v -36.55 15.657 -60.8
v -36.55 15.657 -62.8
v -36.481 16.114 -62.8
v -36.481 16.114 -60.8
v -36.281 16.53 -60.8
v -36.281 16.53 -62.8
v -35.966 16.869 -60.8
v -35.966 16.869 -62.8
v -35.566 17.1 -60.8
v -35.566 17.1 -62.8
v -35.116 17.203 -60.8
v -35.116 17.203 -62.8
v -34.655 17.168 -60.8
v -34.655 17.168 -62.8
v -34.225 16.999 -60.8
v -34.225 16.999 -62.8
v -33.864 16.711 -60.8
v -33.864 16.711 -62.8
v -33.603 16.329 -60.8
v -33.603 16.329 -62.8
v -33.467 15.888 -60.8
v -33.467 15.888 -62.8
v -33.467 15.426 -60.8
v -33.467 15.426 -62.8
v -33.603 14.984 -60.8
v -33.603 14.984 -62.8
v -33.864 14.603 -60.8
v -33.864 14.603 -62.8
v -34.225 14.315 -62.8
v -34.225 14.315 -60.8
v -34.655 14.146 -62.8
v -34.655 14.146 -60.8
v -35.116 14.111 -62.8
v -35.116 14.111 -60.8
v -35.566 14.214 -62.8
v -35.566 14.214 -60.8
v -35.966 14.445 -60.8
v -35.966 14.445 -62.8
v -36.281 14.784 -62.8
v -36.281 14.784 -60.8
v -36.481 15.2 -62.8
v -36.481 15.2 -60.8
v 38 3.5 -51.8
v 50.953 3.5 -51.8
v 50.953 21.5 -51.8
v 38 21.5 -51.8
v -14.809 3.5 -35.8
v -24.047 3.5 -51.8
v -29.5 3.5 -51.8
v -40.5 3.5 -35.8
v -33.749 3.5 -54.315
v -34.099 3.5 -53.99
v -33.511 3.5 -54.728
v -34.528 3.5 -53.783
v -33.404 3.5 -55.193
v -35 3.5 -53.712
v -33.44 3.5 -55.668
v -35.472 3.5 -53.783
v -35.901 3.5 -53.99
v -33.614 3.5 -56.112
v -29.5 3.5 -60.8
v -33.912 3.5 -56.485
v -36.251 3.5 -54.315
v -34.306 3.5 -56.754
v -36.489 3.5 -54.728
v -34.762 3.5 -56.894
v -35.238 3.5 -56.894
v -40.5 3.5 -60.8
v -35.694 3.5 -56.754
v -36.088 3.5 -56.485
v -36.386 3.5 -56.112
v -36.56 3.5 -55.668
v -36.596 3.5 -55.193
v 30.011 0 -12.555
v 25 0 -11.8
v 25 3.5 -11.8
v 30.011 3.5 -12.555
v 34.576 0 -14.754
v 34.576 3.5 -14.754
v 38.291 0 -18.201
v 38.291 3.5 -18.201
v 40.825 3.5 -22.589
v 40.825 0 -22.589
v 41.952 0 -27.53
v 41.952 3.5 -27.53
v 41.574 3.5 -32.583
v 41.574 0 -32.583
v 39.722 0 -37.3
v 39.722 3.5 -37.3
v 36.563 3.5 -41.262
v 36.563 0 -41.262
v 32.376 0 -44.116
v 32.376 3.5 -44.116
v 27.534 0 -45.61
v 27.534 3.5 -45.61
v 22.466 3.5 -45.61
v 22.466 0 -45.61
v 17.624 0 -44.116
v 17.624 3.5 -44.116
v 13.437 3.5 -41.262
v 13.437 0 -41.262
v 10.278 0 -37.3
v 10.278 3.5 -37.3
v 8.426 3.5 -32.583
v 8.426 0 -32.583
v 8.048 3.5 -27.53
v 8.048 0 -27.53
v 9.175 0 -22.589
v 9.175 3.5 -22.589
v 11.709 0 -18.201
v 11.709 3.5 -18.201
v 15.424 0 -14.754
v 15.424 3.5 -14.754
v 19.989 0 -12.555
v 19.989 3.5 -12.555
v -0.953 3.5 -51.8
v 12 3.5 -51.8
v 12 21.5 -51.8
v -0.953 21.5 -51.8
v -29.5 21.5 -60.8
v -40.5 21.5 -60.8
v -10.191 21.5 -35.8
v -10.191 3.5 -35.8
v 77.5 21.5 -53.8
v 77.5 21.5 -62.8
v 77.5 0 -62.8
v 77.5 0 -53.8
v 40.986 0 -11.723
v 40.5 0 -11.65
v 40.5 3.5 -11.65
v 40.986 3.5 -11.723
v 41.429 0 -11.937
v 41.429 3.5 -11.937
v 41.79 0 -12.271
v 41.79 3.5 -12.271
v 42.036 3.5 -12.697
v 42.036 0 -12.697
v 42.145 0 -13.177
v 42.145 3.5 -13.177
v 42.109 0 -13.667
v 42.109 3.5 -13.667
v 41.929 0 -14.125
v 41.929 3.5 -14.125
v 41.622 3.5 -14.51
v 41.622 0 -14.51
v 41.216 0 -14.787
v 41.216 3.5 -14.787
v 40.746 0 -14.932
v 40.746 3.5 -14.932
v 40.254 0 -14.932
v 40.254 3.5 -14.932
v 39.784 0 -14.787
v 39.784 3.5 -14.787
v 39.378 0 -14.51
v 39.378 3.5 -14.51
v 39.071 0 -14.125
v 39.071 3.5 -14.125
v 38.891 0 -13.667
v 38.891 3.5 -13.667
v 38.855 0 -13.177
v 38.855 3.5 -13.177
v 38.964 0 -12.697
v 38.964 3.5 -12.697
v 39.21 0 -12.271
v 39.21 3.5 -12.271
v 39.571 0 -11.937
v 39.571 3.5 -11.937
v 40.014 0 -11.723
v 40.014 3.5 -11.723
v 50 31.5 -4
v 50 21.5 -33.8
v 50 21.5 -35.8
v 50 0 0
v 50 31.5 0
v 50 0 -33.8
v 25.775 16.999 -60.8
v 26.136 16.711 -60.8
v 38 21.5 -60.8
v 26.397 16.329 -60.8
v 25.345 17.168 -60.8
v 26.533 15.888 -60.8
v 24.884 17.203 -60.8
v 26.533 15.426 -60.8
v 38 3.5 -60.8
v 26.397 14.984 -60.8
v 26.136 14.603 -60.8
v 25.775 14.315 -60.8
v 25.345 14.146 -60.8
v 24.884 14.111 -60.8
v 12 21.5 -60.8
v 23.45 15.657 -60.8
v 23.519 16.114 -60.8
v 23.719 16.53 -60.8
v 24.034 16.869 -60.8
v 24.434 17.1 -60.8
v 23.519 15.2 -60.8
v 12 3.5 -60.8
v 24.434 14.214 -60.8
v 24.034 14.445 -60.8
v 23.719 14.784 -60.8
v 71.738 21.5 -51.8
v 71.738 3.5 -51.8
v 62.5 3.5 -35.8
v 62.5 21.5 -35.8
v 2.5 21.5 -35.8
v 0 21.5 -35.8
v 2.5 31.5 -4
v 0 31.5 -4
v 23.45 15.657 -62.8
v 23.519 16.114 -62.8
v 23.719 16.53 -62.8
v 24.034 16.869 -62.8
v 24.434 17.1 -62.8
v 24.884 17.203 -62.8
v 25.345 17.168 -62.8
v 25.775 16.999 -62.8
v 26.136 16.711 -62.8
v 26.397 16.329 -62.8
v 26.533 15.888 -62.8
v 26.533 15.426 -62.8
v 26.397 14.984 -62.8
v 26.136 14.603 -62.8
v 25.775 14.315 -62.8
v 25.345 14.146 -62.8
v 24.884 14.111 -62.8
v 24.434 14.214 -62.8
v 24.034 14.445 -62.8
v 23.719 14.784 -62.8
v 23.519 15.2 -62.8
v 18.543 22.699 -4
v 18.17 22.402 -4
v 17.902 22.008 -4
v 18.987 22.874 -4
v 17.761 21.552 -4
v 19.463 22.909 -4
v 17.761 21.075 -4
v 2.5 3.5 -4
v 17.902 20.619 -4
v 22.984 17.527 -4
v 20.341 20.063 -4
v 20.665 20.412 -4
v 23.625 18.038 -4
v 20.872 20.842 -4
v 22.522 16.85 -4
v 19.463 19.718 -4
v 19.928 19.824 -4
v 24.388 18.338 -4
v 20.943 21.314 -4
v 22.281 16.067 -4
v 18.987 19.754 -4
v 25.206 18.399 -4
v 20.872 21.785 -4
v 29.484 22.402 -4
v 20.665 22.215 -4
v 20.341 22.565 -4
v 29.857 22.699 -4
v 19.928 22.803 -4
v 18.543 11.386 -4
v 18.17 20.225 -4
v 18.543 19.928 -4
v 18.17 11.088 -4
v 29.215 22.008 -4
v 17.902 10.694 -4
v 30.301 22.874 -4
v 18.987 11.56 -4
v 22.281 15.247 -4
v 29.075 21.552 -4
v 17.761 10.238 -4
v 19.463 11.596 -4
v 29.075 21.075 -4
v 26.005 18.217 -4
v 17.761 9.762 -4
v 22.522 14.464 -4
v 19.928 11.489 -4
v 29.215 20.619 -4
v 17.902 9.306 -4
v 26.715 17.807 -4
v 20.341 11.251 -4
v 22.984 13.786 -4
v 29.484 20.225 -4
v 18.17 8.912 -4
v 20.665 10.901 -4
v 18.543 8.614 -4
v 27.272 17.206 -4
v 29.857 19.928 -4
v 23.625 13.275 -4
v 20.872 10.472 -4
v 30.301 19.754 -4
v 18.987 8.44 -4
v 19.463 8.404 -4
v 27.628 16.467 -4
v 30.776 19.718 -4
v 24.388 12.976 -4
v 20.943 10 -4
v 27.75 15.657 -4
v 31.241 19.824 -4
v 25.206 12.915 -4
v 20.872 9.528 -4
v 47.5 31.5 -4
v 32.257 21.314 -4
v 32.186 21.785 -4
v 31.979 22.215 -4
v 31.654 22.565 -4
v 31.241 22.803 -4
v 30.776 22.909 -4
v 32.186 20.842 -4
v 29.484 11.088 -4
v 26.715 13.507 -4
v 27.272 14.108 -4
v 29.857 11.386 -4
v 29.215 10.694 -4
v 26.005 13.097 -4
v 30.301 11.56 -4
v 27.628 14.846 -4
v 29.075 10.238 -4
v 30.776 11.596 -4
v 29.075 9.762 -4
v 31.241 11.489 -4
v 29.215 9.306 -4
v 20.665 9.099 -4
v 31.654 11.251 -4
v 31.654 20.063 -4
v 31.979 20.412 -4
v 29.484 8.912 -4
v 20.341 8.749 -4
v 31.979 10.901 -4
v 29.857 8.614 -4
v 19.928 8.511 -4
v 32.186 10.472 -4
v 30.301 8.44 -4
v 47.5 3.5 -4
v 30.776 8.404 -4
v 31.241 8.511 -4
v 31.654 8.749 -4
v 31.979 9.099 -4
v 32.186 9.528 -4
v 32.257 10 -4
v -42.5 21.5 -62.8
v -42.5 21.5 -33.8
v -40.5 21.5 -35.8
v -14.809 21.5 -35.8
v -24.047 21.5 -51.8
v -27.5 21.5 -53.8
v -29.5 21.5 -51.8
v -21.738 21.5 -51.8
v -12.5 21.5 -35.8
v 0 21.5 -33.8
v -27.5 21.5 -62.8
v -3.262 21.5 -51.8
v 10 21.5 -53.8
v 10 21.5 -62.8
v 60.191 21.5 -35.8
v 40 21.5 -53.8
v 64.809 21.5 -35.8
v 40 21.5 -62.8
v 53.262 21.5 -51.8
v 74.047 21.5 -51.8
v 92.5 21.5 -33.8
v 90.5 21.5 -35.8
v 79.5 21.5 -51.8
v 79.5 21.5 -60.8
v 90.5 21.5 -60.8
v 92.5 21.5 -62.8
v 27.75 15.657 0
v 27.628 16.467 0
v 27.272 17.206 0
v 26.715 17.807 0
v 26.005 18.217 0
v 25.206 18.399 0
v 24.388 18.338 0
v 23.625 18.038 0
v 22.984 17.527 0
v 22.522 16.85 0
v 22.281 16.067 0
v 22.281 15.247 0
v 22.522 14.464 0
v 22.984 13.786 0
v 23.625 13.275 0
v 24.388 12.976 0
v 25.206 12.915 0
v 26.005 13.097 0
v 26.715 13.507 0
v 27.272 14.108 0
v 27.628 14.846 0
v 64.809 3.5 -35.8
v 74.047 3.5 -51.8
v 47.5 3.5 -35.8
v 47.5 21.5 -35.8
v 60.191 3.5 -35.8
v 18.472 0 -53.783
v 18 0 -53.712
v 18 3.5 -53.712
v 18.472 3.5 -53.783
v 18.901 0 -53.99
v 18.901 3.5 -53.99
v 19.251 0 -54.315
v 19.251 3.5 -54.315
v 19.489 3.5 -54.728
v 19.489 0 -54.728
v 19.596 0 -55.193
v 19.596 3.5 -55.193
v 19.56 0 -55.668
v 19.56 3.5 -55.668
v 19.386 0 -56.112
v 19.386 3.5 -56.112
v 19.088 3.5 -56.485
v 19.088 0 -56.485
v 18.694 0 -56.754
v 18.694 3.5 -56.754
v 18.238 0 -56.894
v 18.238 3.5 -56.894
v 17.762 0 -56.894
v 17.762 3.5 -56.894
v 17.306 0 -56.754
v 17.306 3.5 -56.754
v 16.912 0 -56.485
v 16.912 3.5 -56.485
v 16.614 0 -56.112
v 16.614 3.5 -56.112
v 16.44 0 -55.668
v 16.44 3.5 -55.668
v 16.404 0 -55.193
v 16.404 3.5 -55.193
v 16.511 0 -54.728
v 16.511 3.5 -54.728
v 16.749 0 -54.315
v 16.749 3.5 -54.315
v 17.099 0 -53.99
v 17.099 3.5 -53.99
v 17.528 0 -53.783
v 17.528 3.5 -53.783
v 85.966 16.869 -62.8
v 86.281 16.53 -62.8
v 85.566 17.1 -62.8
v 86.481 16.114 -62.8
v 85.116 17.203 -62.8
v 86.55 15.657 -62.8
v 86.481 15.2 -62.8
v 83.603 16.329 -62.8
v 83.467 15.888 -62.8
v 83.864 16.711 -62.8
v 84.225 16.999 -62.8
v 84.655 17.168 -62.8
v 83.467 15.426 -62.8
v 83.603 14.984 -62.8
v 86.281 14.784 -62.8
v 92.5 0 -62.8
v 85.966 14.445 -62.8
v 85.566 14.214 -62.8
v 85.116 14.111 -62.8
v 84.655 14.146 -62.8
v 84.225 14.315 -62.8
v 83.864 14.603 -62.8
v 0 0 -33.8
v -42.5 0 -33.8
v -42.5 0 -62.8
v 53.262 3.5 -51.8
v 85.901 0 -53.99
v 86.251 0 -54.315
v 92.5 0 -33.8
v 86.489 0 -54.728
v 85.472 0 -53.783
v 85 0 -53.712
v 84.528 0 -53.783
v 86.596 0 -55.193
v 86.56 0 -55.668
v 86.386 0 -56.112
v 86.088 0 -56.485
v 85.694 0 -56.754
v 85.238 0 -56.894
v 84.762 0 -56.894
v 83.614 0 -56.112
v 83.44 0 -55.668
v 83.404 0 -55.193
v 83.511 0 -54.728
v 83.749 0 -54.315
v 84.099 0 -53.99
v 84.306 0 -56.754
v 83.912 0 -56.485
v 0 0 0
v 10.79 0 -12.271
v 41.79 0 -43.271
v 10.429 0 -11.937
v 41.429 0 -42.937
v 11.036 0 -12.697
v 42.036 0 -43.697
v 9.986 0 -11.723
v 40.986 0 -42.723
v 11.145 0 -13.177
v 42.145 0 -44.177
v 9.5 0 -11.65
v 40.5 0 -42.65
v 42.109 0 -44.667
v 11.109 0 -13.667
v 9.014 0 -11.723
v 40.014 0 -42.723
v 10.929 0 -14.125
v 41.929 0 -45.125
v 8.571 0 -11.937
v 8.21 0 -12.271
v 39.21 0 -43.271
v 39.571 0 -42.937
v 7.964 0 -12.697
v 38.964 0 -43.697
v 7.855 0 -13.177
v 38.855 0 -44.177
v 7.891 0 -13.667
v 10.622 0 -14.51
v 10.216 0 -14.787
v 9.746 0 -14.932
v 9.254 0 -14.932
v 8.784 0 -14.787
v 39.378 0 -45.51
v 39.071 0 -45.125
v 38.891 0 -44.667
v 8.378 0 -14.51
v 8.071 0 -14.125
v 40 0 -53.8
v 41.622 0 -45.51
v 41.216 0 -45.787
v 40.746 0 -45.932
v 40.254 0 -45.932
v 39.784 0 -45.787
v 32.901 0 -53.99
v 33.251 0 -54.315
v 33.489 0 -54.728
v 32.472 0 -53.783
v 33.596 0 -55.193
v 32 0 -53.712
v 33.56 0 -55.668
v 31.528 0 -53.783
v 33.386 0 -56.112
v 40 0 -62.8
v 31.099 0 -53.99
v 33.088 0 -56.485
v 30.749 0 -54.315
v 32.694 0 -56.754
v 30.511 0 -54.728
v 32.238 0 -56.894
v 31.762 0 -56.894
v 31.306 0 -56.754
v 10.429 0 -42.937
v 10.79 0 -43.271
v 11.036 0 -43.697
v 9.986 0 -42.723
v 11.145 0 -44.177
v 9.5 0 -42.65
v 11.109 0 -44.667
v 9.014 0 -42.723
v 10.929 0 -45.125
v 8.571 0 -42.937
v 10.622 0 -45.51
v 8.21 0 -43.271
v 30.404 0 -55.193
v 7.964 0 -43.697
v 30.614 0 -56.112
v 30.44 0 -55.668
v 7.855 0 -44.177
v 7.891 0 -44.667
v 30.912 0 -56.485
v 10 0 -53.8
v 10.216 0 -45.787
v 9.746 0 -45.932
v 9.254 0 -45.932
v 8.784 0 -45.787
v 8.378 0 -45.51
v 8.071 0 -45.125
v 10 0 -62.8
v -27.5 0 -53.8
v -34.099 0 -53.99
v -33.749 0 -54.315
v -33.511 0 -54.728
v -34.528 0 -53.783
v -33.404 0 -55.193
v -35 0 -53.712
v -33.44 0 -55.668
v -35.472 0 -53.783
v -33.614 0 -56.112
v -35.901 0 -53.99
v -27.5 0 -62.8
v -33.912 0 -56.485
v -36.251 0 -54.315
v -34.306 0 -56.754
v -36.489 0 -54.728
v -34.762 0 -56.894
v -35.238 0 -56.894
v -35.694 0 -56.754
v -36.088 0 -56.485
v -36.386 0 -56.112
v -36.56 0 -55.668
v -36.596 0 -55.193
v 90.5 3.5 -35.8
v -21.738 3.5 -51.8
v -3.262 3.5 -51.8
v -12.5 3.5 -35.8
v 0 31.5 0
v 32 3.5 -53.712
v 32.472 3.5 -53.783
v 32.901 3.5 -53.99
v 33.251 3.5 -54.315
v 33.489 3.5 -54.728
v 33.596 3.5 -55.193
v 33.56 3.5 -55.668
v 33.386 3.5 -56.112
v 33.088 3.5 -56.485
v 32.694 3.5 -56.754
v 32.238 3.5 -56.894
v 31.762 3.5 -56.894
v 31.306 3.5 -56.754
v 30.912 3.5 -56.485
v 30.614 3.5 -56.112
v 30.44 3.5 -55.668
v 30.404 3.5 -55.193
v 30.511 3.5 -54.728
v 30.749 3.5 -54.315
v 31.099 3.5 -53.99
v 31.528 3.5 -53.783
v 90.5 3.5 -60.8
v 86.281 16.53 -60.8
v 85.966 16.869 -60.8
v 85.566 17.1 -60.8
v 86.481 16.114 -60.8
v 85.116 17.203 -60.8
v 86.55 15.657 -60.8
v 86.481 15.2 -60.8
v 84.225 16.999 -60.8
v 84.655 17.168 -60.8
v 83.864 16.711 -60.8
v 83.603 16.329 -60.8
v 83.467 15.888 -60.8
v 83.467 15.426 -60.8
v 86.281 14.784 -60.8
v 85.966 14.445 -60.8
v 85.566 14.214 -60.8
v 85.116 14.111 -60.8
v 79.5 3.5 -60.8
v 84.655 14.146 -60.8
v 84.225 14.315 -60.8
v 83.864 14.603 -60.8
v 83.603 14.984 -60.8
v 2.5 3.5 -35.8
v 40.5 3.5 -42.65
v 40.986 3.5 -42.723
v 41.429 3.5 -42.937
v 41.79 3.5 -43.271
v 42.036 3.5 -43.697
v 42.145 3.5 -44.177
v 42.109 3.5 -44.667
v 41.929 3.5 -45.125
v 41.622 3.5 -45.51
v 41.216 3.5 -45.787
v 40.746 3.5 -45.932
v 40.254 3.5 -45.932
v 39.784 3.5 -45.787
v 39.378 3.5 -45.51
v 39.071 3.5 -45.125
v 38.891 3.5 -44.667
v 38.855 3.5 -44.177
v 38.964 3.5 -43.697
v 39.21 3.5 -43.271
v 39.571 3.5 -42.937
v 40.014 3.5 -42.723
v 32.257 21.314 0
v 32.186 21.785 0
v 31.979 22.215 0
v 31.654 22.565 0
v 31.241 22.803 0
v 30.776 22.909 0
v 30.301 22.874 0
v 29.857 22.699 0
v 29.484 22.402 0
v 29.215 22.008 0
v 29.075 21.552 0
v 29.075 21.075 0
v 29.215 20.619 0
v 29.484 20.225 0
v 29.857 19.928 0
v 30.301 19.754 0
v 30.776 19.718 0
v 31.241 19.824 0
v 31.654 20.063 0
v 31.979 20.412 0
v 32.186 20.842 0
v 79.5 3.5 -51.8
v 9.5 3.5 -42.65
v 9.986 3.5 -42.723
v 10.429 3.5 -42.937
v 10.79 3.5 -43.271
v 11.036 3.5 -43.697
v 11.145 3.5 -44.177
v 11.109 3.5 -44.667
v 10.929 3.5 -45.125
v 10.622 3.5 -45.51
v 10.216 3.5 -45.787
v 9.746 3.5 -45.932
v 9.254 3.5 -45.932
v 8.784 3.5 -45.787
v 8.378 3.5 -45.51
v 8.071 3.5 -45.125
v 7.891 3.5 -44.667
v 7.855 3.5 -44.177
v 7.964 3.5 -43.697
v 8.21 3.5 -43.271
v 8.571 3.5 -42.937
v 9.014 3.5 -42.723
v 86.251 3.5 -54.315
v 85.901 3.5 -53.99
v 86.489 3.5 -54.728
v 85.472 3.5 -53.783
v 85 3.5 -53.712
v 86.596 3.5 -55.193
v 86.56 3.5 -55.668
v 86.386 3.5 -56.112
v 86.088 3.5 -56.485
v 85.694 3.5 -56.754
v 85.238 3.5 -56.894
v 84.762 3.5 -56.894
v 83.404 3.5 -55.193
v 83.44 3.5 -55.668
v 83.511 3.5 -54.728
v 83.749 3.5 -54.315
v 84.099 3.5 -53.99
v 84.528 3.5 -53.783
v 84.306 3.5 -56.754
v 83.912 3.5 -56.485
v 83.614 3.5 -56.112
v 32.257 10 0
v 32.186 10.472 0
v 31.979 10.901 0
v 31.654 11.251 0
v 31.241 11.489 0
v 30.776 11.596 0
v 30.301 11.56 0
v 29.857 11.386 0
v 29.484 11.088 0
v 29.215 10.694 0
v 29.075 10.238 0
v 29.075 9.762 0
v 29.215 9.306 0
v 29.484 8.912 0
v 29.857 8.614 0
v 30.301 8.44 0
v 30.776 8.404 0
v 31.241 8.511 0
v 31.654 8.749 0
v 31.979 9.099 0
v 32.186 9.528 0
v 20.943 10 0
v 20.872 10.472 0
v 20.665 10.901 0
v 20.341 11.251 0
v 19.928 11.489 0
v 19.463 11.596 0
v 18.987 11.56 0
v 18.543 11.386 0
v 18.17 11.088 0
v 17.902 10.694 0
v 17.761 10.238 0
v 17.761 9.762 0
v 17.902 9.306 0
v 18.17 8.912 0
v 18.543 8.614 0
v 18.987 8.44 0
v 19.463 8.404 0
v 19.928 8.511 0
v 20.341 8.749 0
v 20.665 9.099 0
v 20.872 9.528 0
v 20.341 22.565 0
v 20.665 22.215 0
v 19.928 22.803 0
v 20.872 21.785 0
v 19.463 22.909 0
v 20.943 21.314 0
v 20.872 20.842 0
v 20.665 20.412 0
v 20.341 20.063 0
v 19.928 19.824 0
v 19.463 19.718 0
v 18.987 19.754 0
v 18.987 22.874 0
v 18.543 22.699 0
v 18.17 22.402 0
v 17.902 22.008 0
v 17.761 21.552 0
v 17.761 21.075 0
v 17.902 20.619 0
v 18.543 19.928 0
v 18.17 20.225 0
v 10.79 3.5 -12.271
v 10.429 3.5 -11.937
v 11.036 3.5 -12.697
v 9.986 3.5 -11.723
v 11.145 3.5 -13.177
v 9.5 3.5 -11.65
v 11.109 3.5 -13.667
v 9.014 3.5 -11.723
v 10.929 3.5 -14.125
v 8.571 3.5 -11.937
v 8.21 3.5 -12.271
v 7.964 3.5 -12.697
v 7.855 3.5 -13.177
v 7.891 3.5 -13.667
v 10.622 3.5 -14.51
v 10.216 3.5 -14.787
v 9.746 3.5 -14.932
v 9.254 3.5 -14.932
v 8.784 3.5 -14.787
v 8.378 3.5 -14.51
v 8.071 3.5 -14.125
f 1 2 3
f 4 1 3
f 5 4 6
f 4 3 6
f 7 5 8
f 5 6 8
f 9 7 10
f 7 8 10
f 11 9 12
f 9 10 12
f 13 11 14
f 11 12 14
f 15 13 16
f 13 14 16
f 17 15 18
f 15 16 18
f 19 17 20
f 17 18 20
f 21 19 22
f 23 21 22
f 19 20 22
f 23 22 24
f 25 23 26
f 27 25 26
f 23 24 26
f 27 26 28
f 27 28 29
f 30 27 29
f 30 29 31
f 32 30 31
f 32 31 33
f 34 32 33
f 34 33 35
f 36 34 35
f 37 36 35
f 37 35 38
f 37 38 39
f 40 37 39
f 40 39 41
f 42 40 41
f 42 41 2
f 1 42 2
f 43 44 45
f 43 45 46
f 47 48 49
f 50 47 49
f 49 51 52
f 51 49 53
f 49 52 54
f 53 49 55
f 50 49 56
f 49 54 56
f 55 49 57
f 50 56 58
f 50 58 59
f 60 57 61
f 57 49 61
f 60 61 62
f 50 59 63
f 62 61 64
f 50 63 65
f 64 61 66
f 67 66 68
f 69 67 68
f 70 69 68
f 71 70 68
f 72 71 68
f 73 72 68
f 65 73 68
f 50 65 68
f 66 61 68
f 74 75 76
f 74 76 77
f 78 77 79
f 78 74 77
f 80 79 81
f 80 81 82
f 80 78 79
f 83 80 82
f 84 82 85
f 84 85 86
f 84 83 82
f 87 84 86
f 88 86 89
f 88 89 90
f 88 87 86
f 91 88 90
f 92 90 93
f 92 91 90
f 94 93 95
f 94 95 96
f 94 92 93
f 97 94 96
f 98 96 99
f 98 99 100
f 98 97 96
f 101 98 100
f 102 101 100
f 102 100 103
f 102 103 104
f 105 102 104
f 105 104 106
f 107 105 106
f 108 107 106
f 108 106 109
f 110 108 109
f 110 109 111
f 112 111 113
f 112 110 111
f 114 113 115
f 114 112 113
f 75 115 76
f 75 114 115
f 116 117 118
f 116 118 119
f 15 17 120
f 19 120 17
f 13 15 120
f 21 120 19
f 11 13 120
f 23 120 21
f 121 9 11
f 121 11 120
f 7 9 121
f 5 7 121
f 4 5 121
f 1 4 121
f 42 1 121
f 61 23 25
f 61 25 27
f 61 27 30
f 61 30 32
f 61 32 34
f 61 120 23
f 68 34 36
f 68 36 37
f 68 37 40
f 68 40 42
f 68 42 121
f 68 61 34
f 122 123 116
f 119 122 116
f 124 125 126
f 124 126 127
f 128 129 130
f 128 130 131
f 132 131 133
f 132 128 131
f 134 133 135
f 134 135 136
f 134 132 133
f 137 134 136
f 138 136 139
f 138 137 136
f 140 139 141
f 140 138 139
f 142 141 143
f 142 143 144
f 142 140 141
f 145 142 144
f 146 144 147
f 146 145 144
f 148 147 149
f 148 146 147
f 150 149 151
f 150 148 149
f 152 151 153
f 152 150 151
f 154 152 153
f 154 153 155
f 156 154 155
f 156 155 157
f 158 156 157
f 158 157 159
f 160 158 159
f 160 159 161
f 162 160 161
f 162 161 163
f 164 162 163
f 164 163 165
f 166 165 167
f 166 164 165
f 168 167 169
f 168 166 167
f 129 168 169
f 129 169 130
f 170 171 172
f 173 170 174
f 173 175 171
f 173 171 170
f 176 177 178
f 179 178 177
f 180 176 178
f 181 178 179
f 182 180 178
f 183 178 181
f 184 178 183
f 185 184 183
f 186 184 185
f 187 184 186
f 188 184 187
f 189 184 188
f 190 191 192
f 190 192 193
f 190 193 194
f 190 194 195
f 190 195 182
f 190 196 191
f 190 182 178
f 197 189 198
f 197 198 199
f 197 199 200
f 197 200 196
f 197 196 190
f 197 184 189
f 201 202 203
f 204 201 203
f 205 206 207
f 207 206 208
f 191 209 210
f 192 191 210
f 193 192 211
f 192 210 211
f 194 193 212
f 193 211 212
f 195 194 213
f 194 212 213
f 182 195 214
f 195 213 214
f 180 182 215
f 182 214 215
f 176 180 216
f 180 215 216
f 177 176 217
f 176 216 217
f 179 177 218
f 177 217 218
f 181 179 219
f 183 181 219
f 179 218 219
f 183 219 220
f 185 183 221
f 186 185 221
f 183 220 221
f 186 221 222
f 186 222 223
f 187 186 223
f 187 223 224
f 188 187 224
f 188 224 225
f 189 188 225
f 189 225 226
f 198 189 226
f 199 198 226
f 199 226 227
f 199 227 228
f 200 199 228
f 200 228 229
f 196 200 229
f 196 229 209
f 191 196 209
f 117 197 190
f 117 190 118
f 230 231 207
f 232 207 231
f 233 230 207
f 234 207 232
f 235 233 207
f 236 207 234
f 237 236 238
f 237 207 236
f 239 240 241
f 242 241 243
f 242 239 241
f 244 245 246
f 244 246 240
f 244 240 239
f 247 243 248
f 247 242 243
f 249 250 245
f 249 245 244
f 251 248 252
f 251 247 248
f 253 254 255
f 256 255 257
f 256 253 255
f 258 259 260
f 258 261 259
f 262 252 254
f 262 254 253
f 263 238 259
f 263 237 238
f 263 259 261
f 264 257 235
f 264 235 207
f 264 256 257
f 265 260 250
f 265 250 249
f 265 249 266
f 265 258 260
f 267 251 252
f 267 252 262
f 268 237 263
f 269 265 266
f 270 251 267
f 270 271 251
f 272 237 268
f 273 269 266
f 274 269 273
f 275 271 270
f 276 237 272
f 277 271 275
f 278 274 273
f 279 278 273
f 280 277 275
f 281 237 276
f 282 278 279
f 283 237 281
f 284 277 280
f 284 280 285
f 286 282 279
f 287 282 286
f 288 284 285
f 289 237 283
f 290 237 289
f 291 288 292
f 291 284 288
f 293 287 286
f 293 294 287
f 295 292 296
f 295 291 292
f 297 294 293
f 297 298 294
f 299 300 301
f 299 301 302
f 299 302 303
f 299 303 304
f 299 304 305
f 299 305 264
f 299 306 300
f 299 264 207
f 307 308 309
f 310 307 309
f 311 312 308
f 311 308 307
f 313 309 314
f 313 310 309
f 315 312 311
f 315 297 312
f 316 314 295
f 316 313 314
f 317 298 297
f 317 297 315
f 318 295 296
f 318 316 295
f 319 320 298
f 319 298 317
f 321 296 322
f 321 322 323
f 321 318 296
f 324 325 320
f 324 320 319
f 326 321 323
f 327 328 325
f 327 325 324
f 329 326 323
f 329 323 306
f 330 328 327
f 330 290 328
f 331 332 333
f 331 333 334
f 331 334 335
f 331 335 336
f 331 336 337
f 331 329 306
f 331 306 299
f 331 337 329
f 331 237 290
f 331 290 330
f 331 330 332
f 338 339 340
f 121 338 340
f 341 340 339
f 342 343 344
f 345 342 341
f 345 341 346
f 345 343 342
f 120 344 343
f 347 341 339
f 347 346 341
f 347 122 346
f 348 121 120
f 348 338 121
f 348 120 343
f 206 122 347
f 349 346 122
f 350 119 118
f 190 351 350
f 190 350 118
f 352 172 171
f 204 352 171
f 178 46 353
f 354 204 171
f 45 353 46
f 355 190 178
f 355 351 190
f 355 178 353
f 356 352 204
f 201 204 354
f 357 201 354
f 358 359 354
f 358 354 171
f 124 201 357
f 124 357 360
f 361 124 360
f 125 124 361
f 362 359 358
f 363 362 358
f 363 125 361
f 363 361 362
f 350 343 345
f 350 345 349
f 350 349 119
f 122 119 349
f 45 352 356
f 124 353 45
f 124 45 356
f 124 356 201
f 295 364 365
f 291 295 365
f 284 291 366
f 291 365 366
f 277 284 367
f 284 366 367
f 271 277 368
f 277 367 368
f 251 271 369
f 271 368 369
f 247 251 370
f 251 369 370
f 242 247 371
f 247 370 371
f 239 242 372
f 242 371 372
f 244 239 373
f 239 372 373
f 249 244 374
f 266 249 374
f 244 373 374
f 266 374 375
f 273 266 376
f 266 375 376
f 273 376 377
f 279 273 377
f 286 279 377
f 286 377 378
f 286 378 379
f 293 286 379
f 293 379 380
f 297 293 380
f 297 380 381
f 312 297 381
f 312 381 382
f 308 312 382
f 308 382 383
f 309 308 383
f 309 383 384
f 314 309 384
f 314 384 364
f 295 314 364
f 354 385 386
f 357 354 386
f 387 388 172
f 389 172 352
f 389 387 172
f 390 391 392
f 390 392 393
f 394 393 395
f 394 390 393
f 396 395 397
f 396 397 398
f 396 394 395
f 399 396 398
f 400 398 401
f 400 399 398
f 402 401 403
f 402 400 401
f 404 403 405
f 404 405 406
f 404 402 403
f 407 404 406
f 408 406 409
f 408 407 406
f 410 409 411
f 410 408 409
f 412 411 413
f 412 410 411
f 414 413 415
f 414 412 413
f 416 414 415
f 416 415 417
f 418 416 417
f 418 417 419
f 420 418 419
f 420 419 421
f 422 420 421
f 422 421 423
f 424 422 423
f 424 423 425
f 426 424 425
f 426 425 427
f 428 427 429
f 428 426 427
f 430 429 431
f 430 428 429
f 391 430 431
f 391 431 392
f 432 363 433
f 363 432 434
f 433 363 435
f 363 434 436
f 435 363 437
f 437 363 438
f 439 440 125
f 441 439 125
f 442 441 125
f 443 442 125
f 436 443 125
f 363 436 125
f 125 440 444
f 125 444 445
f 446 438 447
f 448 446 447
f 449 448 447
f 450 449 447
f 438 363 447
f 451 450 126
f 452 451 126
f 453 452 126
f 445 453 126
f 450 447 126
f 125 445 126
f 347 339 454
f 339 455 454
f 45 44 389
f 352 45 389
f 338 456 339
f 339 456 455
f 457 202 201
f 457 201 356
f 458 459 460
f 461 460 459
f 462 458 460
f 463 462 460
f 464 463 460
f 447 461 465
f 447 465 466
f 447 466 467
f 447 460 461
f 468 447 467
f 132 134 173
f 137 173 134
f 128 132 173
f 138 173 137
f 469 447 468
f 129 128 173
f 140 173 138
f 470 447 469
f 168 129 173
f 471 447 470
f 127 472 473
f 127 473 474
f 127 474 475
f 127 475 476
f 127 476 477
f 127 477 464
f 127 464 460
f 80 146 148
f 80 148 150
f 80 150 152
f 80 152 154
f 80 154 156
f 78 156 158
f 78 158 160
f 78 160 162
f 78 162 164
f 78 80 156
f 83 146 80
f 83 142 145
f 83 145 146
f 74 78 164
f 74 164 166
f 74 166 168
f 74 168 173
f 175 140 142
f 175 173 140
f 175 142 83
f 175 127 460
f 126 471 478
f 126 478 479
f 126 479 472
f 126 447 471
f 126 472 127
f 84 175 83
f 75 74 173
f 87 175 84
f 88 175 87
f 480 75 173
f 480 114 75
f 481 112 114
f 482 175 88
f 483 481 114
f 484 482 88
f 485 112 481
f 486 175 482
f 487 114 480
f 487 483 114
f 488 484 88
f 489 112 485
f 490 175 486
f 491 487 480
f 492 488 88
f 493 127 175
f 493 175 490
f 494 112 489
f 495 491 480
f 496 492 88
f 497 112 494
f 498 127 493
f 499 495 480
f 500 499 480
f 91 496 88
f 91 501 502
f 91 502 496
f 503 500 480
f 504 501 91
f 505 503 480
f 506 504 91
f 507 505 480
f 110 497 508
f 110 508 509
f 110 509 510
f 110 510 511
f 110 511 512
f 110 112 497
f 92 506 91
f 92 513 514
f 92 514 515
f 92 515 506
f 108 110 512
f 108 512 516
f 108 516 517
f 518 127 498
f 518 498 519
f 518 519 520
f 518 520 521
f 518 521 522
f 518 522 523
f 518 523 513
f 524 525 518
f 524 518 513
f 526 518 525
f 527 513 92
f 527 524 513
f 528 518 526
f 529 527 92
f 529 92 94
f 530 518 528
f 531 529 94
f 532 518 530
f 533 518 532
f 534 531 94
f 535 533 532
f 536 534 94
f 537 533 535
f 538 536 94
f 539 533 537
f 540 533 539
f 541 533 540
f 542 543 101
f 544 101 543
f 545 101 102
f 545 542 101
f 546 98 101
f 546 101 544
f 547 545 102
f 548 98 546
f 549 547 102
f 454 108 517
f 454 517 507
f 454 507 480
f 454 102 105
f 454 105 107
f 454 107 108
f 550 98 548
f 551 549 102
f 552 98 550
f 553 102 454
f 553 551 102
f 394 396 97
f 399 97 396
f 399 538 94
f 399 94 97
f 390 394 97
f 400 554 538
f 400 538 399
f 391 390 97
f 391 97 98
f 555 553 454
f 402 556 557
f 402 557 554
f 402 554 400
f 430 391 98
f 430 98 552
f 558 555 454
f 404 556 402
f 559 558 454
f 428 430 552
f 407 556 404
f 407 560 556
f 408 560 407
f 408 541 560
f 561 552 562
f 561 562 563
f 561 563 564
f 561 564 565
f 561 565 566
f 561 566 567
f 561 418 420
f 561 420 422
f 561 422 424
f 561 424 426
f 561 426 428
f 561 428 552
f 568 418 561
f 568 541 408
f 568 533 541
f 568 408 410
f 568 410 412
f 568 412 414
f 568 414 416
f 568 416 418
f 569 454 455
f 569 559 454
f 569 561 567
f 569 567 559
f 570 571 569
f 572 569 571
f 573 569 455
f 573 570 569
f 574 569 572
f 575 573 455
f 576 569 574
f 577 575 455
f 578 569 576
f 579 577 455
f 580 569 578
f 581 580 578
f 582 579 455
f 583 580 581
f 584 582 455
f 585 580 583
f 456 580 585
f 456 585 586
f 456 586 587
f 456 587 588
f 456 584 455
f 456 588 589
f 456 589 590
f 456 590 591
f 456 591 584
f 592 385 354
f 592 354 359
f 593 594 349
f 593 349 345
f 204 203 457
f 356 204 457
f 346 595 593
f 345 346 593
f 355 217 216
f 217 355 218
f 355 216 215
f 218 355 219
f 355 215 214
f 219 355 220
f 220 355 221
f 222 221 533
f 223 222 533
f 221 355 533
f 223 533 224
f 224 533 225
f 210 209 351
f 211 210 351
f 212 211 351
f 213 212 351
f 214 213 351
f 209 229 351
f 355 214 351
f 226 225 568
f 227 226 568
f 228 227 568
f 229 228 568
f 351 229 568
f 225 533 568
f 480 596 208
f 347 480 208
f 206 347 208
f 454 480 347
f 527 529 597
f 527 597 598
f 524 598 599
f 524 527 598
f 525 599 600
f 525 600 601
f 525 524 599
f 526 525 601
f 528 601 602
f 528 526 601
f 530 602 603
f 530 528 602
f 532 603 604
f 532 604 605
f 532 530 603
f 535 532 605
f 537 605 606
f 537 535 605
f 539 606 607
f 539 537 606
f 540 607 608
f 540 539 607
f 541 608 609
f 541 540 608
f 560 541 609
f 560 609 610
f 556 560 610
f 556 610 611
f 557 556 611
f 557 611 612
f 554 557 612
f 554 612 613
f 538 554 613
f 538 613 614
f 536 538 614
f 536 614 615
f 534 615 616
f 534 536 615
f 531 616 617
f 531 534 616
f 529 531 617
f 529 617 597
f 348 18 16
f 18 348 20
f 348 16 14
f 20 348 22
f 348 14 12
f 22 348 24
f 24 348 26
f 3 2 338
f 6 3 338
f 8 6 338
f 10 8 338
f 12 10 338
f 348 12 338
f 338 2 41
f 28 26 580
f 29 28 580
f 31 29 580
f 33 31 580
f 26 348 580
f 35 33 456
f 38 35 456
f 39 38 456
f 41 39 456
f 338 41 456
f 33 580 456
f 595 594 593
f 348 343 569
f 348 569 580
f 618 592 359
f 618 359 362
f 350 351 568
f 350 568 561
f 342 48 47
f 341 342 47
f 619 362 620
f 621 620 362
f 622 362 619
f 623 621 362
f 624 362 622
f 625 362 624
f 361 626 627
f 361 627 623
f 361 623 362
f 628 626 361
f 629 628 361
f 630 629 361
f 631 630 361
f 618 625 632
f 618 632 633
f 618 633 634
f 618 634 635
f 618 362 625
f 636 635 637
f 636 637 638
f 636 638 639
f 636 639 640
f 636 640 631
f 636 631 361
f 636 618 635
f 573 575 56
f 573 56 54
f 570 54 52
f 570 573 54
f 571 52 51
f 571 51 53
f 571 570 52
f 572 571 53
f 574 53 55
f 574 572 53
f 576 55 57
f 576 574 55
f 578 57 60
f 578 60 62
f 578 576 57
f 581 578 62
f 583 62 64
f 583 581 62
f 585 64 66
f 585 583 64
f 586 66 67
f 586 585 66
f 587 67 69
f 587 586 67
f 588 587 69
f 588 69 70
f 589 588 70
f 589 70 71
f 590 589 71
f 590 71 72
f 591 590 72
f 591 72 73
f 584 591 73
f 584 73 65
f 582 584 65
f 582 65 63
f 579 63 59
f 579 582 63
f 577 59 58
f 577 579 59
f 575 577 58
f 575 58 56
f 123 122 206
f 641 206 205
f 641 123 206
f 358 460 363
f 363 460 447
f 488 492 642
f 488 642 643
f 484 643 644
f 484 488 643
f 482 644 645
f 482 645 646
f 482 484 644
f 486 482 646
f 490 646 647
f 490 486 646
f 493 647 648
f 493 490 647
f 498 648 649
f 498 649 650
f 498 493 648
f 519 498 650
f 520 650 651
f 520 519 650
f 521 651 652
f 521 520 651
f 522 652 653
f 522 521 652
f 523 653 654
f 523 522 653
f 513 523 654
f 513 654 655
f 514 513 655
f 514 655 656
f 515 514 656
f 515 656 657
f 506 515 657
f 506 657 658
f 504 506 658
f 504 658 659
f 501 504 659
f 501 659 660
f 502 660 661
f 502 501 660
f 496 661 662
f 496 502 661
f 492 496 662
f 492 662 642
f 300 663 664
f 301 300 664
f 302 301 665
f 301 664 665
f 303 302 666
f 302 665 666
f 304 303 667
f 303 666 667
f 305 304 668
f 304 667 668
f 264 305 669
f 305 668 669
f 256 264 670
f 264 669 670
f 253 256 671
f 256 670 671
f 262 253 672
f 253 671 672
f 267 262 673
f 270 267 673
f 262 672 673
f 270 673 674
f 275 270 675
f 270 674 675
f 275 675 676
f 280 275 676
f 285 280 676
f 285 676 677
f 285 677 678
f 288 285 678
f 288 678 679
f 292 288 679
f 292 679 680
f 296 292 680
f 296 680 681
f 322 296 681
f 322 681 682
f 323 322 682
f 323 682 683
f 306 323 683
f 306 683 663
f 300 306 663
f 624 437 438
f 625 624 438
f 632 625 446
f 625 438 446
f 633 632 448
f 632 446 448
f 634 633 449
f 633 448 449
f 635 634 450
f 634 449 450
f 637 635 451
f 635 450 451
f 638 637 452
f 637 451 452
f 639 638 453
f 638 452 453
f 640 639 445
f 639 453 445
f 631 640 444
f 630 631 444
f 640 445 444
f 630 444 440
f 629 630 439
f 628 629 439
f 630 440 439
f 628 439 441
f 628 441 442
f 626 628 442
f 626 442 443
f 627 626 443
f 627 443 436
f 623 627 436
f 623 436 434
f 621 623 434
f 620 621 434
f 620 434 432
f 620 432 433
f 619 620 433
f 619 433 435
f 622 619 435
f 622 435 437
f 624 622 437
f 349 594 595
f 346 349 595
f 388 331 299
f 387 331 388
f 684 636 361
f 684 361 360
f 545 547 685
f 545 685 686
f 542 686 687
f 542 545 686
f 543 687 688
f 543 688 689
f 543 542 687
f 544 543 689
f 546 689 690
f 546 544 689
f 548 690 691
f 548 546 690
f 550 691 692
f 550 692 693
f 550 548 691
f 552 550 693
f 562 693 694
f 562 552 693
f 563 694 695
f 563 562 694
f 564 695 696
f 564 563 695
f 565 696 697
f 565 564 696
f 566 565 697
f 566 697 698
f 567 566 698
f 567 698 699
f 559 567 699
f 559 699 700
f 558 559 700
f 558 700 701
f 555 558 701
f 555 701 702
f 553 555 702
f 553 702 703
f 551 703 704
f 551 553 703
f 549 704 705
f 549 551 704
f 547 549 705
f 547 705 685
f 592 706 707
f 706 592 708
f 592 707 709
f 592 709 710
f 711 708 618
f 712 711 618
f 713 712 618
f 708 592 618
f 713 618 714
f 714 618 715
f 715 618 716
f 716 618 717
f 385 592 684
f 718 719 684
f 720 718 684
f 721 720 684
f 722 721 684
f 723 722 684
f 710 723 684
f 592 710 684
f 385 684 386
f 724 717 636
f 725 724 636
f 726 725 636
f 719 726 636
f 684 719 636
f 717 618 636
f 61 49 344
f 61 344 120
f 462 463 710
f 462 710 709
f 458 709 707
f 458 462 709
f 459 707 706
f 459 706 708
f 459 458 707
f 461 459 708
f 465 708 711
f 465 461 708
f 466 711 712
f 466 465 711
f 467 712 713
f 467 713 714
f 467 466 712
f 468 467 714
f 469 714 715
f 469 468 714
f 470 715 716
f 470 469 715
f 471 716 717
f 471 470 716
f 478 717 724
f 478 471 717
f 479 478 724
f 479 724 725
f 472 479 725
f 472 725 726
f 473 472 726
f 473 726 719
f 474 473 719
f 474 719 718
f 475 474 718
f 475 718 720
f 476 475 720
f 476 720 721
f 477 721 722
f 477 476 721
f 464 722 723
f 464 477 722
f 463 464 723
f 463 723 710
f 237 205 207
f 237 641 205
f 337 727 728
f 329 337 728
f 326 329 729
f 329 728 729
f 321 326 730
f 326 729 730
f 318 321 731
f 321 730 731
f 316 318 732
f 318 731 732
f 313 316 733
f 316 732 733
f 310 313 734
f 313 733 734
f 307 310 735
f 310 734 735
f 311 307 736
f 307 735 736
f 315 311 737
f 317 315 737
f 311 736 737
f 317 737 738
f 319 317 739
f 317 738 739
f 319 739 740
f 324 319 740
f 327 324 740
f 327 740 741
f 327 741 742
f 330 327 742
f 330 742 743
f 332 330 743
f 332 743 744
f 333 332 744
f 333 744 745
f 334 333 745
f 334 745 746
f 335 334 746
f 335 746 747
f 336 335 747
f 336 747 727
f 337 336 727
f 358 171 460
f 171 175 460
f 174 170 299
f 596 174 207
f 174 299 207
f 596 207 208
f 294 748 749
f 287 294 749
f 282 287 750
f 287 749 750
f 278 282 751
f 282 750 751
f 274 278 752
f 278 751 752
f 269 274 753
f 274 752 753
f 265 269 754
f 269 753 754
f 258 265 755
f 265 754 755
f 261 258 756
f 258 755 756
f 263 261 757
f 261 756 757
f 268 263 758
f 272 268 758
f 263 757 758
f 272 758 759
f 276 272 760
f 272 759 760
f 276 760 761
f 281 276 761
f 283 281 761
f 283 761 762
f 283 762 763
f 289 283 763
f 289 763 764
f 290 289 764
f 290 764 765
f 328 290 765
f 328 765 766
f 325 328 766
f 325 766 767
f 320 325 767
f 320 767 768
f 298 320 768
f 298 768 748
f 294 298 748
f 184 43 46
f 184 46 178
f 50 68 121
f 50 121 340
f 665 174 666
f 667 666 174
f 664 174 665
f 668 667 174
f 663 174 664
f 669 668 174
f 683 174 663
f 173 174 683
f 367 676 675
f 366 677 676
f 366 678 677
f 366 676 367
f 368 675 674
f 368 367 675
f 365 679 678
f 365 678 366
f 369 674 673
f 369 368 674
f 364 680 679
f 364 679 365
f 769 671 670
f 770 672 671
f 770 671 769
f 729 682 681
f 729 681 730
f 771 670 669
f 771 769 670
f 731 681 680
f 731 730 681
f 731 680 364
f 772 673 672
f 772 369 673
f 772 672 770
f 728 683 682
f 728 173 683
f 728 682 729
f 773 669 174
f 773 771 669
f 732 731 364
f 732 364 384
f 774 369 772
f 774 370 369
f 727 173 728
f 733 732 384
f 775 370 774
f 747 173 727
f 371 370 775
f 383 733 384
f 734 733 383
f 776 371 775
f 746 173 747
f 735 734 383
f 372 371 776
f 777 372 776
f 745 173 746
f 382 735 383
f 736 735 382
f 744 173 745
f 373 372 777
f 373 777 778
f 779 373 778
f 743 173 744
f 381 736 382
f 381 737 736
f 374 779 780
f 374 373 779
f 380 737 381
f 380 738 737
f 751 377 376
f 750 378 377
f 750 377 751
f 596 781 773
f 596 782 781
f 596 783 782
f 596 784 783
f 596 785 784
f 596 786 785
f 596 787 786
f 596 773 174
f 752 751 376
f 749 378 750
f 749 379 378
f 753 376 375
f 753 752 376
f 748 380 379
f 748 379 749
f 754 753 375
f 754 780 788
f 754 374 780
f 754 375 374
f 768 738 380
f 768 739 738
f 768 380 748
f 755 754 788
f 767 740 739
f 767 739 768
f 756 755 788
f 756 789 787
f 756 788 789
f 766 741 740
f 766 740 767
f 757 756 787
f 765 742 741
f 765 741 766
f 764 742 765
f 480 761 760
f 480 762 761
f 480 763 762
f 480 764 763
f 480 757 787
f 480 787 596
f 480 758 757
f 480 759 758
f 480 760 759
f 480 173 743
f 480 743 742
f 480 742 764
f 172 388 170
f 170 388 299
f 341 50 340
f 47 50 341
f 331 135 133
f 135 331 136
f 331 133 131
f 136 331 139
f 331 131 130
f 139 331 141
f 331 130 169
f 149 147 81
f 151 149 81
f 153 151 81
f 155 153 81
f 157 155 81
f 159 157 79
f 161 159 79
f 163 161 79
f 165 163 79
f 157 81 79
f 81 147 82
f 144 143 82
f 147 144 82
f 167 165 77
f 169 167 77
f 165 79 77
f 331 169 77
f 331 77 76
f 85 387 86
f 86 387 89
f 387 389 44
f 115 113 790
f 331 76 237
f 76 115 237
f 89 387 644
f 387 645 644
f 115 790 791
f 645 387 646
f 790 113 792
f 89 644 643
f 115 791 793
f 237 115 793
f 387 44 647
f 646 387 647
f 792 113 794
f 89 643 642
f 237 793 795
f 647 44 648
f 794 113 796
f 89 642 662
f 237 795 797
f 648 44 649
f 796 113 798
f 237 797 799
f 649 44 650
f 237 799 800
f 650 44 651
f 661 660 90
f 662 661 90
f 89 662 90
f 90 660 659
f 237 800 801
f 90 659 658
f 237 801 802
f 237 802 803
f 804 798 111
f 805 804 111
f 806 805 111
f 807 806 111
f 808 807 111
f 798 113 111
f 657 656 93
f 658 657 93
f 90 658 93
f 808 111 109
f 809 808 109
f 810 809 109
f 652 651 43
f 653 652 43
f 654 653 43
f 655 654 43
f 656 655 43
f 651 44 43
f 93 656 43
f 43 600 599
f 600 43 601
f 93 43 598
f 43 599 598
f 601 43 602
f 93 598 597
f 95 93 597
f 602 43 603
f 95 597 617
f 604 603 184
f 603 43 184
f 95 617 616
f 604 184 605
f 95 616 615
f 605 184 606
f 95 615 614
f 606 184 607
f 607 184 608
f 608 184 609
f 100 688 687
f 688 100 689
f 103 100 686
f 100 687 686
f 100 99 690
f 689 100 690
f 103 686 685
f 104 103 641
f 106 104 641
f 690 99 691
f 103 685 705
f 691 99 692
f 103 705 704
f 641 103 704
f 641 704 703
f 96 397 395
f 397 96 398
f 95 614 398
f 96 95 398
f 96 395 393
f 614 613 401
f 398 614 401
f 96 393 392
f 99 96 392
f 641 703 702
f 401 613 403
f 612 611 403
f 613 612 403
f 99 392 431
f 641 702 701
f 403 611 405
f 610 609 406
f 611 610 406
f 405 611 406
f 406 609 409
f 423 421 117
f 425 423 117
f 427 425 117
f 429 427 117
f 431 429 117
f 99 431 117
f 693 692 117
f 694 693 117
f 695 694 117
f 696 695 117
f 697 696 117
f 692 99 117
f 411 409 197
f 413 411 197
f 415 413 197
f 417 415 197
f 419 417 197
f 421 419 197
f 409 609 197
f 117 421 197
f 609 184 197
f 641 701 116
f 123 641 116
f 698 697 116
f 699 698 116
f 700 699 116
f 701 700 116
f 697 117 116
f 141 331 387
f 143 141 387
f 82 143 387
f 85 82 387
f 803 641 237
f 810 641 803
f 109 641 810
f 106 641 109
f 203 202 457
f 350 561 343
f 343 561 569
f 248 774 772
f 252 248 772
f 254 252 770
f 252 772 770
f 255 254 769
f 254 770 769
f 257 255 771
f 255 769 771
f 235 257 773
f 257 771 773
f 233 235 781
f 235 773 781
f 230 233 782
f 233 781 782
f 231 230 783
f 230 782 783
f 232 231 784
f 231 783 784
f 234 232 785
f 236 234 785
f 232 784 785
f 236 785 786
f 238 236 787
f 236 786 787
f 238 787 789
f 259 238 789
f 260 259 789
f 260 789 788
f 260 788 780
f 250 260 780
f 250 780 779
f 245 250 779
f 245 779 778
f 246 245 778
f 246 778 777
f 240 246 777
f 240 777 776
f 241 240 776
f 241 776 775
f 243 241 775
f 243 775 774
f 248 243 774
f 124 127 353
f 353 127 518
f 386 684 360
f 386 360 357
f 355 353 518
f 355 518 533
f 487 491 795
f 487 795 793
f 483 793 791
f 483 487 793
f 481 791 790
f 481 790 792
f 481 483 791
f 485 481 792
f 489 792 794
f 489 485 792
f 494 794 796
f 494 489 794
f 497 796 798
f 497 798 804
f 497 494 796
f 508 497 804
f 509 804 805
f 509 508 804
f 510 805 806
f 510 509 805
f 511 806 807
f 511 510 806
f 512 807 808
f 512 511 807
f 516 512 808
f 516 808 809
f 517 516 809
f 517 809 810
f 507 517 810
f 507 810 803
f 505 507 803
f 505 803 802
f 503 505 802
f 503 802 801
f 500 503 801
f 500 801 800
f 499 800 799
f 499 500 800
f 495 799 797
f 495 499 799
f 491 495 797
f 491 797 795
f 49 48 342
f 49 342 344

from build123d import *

# Parameters (mm, degrees)
SKETCH_2_R          = 1.6
SKETCH_2_R_2        = 17
SKETCH_2_R_3        = 1.65
EXTRUDE_2_DEPTH     = 3.5
EXTRUDE_3_DEPTH     = 18
EXTRUDE_4_DEPTH     = 10
CUT_EXTRUDE_5_DEPTH = 117.156532317
SKETCH_10_R         = 2.75
SKETCH_10_R_2       = 1.6
CUT_EXTRUDE_4_DEPTH = 5
EXTRUDE_5_DEPTH     = 18
SKETCH_14_R         = 1.55
CUT_EXTRUDE_6_DEPTH = 10


with BuildPart() as part:
    # 草图2 → 凸台-拉伸2 (new body)
    with BuildSketch(Plane(origin=(0, 0, 0), x_dir=(1, 0, 0), z_dir=(0, 1, 0))):
        Polygon((-42.5, 33.8), (-42.5, 62.8), (-27.5, 62.8), (-27.5, 53.8), (10, 53.8), (10, 62.8), (40, 62.8), (40, 53.8), (77.5, 53.8), (77.5, 62.8), (92.5, 62.8), (92.5, 33.8), (50, 33.8), (50, 0), (0, 0), (0, 33.8), align=None)
        with Locations(Location((-35, 55.312210178, 0), (0, 0, 270))):
            Circle(SKETCH_2_R, mode=Mode.SUBTRACT)
        with Locations(Location((85, 55.312210178, 0), (0, 0, 270))):
            Circle(SKETCH_2_R, mode=Mode.SUBTRACT)
        with Locations(Location((18, 55.312210178, 0), (0, 0, 270))):
            Circle(SKETCH_2_R, mode=Mode.SUBTRACT)
        with Locations(Location((32, 55.312210178, 0), (0, 0, 270))):
            Circle(SKETCH_2_R, mode=Mode.SUBTRACT)
        with Locations(Location((25, 28.8, 0), (0, 0, 270))):
            Circle(SKETCH_2_R_2, mode=Mode.SUBTRACT)
        with Locations(Location((40.5, 44.3, 0), (0, 0, 270))):
            Circle(SKETCH_2_R_3, mode=Mode.SUBTRACT)
        with Locations(Location((40.5, 13.3, 0), (0, 0, 270))):
            Circle(SKETCH_2_R_3, mode=Mode.SUBTRACT)
        with Locations(Location((9.5, 13.3, 0), (0, 0, 270))):
            Circle(SKETCH_2_R_3, mode=Mode.SUBTRACT)
        with Locations(Location((9.5, 44.3, 0), (0, 0, 270))):
            Circle(SKETCH_2_R_3, mode=Mode.SUBTRACT)
    extrude(amount=EXTRUDE_2_DEPTH)

    # 草图6 → 凸台-拉伸3 (add)
    with BuildSketch(Plane(origin=(0, 3.5, 0), x_dir=(1, 0, 0), z_dir=(0, 1, 0))):
        Polygon((10, 53.8), (-27.5, 53.8), (-27.5, 62.8), (-42.5, 62.8), (-42.5, 33.8), (0, 33.8), (0, 0), (50, 0), (50, 33.8), (92.5, 33.8), (92.5, 62.8), (77.5, 62.8), (77.5, 53.8), (40, 53.8), (40, 62.8), (10, 62.8), align=None)
        Polygon((12, 51.8), (-29.5, 51.8), (-29.5, 60.8), (-40.5, 60.8), (-40.5, 35.8), (2.5, 35.8), (2.5, 4), (47.5, 4), (47.5, 35.8), (90.5, 35.8), (90.5, 60.8), (79.5, 60.8), (79.5, 51.8), (38, 51.8), (38, 60.8), (12, 60.8), align=None, mode=Mode.SUBTRACT)
    extrude(amount=EXTRUDE_3_DEPTH)

    # 草图11 → 凸台-拉伸4 (add)
    with BuildSketch(Plane(origin=(0, 21.5, 0), x_dir=(1, 0, 0), z_dir=(0, 1, 0))):
        Polygon((2.5, 35.8), (2.5, 4), (47.5, 4), (47.5, 35.8), (50, 35.8), (50, 0), (0, 0), (0, 35.8), align=None)
    extrude(amount=EXTRUDE_4_DEPTH)

    # 草图12 → 切除-拉伸5 (cut, through all)
    with BuildSketch(Plane.ZY):
        Polygon((-35.8, 21.5), (-4, 31.5), (-35.8, 31.5), align=None)
    extrude(amount=-CUT_EXTRUDE_5_DEPTH, mode=Mode.SUBTRACT)

    # 草图10 → 切除-拉伸4 (cut)
    with BuildSketch(Plane.XY):
        with Locations((25, 15.656854249)):
            Circle(SKETCH_10_R)
        with Locations((30.656854249, 21.313708499)):
            Circle(SKETCH_10_R_2)
        with Locations((30.656854249, 10)):
            Circle(SKETCH_10_R_2)
        with Locations((19.343145751, 10)):
            Circle(SKETCH_10_R_2)
        with Locations((19.343145751, 21.313708499)):
            Circle(SKETCH_10_R_2)
    extrude(amount=-CUT_EXTRUDE_4_DEPTH, mode=Mode.SUBTRACT)

    # 草图13 → 凸台-拉伸5 (add)
    with BuildSketch(Plane(origin=(0, 3.5, 0), x_dir=(1, 0, 0), z_dir=(0, 1, 0))):
        Polygon((-12.5, 35.8), (-21.737604307, 51.8), (-24.047005384, 51.8), (-14.809401077, 35.8), align=None)
        Polygon((-3.262395693, 51.8), (-12.5, 35.8), (-10.190598923, 35.8), (-0.952994616, 51.8), align=None)
        Polygon((50.952994616, 51.8), (60.190598923, 35.8), (62.5, 35.8), (53.262395693, 51.8), align=None)
        Polygon((71.737604307, 51.8), (62.5, 35.8), (64.809401077, 35.8), (74.047005384, 51.8), align=None)
    extrude(amount=EXTRUDE_5_DEPTH)

    # 草图14 → 切除-拉伸6 (cut)
    with BuildSketch(Plane(origin=(0, 0, -62.8), x_dir=(-1, 0, 0), z_dir=(0, 0, -1))):
        with Locations((35, 15.656854249)):
            Circle(SKETCH_14_R)
        with Locations(Location((-85, 15.656854249, 0), (0, 0, 180))):
            Circle(SKETCH_14_R)
        with Locations((-25, 15.656854249)):
            Circle(SKETCH_14_R)
    extrude(amount=-CUT_EXTRUDE_6_DEPTH, mode=Mode.SUBTRACT)


solid = part.part
